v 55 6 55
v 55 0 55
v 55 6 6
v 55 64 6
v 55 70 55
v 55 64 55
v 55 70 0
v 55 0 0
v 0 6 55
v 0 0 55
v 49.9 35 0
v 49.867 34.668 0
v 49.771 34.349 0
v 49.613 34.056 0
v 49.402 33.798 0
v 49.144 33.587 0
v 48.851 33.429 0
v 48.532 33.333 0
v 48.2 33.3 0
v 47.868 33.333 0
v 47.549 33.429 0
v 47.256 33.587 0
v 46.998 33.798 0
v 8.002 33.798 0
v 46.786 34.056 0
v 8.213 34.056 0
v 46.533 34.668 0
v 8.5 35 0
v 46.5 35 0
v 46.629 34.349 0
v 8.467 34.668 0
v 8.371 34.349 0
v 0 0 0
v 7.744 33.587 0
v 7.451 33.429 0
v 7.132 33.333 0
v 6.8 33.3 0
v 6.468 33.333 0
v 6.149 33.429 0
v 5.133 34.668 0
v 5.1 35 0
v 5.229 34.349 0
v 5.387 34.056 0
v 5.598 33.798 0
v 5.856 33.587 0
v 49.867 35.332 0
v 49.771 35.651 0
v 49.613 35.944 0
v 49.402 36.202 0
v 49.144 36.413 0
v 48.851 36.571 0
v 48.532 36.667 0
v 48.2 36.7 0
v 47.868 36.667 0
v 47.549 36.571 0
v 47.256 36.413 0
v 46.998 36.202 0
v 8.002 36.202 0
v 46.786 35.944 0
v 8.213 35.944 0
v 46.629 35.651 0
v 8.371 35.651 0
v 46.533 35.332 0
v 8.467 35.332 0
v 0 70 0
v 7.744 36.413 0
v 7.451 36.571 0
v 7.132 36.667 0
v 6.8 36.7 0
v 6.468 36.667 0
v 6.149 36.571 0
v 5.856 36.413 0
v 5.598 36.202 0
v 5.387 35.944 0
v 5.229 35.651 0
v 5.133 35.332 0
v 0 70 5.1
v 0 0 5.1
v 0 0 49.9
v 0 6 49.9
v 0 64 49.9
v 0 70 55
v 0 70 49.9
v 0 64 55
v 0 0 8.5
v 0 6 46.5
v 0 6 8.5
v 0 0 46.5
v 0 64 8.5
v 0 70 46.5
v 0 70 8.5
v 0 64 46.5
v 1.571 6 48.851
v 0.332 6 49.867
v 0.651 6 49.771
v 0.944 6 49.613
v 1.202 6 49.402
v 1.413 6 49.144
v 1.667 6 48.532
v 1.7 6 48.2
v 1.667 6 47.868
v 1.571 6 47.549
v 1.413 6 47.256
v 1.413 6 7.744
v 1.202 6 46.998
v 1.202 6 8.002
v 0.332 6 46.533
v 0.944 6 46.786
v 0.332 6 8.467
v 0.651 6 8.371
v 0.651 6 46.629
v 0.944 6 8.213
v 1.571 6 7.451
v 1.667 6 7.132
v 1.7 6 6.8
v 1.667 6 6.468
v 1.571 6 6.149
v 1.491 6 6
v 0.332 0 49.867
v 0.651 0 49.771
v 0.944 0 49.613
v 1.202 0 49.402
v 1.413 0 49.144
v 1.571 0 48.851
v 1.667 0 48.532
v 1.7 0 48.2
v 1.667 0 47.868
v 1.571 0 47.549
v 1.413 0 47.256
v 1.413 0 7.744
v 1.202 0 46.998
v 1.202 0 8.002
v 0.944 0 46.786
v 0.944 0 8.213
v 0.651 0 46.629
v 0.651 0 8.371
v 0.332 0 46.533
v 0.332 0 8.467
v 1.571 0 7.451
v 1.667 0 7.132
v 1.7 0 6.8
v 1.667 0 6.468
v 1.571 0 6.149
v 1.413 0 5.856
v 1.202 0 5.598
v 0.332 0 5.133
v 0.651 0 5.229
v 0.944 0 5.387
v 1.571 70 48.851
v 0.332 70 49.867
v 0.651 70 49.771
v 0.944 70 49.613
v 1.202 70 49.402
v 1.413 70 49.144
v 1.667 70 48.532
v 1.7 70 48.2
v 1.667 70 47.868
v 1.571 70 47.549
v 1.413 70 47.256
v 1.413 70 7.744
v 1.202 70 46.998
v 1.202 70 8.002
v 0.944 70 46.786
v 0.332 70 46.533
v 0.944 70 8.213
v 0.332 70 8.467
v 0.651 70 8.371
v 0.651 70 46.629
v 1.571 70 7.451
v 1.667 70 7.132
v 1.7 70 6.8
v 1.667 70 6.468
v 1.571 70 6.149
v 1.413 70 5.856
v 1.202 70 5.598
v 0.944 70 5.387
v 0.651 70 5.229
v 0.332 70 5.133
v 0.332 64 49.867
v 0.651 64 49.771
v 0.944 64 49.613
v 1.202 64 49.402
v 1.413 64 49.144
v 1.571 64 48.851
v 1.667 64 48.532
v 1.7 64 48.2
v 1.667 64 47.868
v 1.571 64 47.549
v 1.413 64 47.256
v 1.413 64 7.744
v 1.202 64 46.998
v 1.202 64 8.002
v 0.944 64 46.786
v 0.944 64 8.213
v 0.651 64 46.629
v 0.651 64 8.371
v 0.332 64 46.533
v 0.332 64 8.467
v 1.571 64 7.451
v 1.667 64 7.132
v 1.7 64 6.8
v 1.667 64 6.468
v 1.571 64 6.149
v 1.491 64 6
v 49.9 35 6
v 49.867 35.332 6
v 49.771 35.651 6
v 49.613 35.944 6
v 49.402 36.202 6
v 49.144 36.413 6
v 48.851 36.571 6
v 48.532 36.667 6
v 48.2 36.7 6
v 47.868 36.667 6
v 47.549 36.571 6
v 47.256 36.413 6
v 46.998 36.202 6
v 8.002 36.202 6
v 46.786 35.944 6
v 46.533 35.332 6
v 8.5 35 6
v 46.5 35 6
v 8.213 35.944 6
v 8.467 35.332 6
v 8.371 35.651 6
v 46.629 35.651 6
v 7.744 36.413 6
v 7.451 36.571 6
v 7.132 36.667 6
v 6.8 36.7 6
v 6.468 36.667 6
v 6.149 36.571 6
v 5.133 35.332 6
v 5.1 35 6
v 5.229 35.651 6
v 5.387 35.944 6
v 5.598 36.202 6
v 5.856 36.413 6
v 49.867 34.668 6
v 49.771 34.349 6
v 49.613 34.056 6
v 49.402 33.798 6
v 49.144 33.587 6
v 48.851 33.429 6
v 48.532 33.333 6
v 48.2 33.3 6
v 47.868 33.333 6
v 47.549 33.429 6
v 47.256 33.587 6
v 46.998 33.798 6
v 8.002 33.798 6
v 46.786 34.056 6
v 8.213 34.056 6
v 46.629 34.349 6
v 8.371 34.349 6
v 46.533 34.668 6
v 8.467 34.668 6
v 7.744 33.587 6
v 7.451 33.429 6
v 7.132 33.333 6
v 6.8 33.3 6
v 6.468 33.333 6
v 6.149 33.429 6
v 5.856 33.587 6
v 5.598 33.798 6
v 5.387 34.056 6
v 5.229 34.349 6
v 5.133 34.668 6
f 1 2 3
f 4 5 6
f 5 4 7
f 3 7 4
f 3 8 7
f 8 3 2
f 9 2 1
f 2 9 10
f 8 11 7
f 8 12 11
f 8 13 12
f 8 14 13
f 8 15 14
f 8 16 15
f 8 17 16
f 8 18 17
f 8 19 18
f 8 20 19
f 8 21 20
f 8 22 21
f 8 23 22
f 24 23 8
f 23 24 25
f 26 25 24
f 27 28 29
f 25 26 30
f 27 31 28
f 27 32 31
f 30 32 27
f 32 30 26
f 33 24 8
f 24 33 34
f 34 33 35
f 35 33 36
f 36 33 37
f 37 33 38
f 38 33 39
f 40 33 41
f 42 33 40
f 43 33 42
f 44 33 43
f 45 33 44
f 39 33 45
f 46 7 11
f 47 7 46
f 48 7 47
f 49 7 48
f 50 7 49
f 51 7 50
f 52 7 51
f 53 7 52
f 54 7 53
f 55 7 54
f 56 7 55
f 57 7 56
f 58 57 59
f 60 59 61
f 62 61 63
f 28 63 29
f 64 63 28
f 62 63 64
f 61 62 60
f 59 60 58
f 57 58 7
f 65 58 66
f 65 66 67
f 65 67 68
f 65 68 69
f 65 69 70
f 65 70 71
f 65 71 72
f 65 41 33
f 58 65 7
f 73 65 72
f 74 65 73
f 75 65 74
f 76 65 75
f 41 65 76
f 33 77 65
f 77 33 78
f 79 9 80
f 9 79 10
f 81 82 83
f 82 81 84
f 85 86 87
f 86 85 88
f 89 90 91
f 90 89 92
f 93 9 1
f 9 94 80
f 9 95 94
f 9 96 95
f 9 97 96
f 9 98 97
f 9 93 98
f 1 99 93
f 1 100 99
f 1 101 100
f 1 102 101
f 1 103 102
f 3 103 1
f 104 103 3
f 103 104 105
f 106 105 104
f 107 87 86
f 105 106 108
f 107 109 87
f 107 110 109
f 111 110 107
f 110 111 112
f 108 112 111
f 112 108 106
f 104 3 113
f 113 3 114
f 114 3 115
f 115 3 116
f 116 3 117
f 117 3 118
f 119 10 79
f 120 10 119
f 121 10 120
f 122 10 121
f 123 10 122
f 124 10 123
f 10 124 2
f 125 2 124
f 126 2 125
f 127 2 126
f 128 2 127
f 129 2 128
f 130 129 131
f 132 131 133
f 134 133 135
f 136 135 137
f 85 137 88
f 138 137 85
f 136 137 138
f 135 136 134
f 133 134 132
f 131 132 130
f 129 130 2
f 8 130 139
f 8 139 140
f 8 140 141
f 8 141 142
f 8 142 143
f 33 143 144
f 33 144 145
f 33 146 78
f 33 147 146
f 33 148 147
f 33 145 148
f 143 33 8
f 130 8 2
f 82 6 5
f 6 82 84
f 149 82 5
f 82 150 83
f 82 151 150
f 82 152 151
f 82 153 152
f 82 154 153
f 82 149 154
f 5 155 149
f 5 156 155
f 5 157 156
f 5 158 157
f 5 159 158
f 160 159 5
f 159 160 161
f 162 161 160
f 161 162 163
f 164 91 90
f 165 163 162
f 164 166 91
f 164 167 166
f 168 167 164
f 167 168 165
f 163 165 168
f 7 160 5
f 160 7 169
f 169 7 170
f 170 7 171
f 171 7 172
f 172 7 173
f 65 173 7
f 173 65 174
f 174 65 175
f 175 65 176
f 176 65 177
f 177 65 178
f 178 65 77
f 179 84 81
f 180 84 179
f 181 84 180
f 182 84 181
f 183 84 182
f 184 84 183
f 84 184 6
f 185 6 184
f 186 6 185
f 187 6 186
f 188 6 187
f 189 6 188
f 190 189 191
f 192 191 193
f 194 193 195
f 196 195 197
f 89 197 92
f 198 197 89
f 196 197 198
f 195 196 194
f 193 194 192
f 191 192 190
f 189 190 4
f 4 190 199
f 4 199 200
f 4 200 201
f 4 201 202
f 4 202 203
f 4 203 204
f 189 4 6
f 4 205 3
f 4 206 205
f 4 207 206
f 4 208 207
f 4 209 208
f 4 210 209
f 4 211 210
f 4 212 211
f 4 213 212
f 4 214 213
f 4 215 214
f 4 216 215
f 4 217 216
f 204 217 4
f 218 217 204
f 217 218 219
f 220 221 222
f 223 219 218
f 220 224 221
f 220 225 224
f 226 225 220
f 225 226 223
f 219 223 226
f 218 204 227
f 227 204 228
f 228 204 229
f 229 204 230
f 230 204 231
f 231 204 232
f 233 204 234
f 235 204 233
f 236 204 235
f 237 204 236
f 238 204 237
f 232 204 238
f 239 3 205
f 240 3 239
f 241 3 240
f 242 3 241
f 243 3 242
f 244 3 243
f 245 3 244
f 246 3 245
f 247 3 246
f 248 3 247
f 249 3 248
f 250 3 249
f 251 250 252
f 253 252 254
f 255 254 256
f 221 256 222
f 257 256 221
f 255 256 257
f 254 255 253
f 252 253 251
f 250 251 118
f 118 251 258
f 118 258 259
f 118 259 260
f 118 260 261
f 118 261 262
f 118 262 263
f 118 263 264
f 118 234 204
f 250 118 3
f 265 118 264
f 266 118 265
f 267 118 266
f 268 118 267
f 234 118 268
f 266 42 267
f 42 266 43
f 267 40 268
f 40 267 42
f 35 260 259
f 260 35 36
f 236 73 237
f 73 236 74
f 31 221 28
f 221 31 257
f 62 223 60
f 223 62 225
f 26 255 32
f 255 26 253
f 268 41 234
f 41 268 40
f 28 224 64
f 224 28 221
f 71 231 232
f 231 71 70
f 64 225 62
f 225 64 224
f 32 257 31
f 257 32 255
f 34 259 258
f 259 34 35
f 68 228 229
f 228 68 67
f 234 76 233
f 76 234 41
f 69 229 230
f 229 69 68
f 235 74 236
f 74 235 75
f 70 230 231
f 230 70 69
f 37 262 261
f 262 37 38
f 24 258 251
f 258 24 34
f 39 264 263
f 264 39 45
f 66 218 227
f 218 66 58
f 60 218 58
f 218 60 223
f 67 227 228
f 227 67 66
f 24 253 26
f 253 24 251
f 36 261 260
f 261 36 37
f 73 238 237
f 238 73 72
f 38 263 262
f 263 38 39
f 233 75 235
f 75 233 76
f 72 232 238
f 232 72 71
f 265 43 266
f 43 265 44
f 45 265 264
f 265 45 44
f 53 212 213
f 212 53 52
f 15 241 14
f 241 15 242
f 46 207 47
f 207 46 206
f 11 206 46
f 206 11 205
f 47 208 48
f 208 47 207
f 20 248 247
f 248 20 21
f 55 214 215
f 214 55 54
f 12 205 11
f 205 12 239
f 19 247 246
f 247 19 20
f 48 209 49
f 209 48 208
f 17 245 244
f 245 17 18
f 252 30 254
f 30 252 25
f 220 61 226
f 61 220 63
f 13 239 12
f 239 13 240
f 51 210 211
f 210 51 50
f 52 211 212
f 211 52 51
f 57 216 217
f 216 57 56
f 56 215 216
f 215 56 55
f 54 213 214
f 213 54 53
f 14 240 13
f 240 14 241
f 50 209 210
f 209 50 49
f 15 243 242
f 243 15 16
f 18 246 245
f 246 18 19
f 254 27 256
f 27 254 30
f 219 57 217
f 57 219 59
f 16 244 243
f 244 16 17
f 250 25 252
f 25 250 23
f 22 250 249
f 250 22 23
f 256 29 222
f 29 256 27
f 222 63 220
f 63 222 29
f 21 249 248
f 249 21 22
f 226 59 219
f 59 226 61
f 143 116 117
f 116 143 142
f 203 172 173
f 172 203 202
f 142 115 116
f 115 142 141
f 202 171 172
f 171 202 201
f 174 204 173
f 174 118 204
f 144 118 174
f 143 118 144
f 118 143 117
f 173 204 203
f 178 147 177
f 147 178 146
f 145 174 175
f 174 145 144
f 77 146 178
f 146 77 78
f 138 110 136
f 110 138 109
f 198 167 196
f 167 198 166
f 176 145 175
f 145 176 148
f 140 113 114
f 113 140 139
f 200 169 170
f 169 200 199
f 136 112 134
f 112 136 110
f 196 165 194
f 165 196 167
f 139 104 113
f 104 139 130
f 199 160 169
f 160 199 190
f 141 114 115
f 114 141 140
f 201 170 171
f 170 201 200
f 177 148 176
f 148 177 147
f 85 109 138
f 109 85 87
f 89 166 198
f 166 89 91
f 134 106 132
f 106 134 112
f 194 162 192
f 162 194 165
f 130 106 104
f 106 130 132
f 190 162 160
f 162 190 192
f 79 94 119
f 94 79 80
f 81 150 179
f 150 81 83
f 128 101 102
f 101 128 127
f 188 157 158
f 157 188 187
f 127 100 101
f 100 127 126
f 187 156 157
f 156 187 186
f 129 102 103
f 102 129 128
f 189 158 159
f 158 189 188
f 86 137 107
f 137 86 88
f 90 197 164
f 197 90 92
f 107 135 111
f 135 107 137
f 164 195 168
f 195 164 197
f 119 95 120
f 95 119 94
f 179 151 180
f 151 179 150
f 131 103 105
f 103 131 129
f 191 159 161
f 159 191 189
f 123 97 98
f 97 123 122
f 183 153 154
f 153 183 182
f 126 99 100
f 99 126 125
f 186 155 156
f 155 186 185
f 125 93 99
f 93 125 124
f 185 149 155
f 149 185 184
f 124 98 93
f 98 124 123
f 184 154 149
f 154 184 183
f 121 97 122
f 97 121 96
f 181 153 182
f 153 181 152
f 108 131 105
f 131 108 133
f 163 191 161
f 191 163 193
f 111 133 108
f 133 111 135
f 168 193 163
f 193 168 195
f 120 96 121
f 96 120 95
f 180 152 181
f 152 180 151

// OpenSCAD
$fn = 32;

// ----------------------------------------------------------------------
// U-bracket: 55 x 70 x 55 mm
// ----------------------------------------------------------------------

// --- parameters (mm) ---
span = 55;                // outer length, X
outer_w = 70;             // outer width, Y
wall_h = 55;              // upright height, Z
plate_t = 6;              // wall thickness
hole_d = 3.4;             // clearance for M3

module hole_z(px, py) {
  translate([px, py, -0.5]) cylinder(h = plate_t + 1, d = hole_d);
}
module hole_y_pz(pz) {
  /* through both uprights along Y */
  translate([0, -0.5, pz]) rotate([-90, 0, 0]) cylinder(h = outer_w + 1, d = hole_d);
}

module base() {
  cube([span, outer_w, plate_t]);
}

module uprights() {
  cube([span, plate_t, wall_h]);
  translate([0, outer_w - plate_t, 0]) cube([span, plate_t, wall_h]);
}

difference() {
  union() {
    base();
    uprights();
  }
  hole_z(6.8, 35);
  hole_z(48.2, 35);
  hole_y_pz(6.8);
  hole_y_pz(48.2);
}
